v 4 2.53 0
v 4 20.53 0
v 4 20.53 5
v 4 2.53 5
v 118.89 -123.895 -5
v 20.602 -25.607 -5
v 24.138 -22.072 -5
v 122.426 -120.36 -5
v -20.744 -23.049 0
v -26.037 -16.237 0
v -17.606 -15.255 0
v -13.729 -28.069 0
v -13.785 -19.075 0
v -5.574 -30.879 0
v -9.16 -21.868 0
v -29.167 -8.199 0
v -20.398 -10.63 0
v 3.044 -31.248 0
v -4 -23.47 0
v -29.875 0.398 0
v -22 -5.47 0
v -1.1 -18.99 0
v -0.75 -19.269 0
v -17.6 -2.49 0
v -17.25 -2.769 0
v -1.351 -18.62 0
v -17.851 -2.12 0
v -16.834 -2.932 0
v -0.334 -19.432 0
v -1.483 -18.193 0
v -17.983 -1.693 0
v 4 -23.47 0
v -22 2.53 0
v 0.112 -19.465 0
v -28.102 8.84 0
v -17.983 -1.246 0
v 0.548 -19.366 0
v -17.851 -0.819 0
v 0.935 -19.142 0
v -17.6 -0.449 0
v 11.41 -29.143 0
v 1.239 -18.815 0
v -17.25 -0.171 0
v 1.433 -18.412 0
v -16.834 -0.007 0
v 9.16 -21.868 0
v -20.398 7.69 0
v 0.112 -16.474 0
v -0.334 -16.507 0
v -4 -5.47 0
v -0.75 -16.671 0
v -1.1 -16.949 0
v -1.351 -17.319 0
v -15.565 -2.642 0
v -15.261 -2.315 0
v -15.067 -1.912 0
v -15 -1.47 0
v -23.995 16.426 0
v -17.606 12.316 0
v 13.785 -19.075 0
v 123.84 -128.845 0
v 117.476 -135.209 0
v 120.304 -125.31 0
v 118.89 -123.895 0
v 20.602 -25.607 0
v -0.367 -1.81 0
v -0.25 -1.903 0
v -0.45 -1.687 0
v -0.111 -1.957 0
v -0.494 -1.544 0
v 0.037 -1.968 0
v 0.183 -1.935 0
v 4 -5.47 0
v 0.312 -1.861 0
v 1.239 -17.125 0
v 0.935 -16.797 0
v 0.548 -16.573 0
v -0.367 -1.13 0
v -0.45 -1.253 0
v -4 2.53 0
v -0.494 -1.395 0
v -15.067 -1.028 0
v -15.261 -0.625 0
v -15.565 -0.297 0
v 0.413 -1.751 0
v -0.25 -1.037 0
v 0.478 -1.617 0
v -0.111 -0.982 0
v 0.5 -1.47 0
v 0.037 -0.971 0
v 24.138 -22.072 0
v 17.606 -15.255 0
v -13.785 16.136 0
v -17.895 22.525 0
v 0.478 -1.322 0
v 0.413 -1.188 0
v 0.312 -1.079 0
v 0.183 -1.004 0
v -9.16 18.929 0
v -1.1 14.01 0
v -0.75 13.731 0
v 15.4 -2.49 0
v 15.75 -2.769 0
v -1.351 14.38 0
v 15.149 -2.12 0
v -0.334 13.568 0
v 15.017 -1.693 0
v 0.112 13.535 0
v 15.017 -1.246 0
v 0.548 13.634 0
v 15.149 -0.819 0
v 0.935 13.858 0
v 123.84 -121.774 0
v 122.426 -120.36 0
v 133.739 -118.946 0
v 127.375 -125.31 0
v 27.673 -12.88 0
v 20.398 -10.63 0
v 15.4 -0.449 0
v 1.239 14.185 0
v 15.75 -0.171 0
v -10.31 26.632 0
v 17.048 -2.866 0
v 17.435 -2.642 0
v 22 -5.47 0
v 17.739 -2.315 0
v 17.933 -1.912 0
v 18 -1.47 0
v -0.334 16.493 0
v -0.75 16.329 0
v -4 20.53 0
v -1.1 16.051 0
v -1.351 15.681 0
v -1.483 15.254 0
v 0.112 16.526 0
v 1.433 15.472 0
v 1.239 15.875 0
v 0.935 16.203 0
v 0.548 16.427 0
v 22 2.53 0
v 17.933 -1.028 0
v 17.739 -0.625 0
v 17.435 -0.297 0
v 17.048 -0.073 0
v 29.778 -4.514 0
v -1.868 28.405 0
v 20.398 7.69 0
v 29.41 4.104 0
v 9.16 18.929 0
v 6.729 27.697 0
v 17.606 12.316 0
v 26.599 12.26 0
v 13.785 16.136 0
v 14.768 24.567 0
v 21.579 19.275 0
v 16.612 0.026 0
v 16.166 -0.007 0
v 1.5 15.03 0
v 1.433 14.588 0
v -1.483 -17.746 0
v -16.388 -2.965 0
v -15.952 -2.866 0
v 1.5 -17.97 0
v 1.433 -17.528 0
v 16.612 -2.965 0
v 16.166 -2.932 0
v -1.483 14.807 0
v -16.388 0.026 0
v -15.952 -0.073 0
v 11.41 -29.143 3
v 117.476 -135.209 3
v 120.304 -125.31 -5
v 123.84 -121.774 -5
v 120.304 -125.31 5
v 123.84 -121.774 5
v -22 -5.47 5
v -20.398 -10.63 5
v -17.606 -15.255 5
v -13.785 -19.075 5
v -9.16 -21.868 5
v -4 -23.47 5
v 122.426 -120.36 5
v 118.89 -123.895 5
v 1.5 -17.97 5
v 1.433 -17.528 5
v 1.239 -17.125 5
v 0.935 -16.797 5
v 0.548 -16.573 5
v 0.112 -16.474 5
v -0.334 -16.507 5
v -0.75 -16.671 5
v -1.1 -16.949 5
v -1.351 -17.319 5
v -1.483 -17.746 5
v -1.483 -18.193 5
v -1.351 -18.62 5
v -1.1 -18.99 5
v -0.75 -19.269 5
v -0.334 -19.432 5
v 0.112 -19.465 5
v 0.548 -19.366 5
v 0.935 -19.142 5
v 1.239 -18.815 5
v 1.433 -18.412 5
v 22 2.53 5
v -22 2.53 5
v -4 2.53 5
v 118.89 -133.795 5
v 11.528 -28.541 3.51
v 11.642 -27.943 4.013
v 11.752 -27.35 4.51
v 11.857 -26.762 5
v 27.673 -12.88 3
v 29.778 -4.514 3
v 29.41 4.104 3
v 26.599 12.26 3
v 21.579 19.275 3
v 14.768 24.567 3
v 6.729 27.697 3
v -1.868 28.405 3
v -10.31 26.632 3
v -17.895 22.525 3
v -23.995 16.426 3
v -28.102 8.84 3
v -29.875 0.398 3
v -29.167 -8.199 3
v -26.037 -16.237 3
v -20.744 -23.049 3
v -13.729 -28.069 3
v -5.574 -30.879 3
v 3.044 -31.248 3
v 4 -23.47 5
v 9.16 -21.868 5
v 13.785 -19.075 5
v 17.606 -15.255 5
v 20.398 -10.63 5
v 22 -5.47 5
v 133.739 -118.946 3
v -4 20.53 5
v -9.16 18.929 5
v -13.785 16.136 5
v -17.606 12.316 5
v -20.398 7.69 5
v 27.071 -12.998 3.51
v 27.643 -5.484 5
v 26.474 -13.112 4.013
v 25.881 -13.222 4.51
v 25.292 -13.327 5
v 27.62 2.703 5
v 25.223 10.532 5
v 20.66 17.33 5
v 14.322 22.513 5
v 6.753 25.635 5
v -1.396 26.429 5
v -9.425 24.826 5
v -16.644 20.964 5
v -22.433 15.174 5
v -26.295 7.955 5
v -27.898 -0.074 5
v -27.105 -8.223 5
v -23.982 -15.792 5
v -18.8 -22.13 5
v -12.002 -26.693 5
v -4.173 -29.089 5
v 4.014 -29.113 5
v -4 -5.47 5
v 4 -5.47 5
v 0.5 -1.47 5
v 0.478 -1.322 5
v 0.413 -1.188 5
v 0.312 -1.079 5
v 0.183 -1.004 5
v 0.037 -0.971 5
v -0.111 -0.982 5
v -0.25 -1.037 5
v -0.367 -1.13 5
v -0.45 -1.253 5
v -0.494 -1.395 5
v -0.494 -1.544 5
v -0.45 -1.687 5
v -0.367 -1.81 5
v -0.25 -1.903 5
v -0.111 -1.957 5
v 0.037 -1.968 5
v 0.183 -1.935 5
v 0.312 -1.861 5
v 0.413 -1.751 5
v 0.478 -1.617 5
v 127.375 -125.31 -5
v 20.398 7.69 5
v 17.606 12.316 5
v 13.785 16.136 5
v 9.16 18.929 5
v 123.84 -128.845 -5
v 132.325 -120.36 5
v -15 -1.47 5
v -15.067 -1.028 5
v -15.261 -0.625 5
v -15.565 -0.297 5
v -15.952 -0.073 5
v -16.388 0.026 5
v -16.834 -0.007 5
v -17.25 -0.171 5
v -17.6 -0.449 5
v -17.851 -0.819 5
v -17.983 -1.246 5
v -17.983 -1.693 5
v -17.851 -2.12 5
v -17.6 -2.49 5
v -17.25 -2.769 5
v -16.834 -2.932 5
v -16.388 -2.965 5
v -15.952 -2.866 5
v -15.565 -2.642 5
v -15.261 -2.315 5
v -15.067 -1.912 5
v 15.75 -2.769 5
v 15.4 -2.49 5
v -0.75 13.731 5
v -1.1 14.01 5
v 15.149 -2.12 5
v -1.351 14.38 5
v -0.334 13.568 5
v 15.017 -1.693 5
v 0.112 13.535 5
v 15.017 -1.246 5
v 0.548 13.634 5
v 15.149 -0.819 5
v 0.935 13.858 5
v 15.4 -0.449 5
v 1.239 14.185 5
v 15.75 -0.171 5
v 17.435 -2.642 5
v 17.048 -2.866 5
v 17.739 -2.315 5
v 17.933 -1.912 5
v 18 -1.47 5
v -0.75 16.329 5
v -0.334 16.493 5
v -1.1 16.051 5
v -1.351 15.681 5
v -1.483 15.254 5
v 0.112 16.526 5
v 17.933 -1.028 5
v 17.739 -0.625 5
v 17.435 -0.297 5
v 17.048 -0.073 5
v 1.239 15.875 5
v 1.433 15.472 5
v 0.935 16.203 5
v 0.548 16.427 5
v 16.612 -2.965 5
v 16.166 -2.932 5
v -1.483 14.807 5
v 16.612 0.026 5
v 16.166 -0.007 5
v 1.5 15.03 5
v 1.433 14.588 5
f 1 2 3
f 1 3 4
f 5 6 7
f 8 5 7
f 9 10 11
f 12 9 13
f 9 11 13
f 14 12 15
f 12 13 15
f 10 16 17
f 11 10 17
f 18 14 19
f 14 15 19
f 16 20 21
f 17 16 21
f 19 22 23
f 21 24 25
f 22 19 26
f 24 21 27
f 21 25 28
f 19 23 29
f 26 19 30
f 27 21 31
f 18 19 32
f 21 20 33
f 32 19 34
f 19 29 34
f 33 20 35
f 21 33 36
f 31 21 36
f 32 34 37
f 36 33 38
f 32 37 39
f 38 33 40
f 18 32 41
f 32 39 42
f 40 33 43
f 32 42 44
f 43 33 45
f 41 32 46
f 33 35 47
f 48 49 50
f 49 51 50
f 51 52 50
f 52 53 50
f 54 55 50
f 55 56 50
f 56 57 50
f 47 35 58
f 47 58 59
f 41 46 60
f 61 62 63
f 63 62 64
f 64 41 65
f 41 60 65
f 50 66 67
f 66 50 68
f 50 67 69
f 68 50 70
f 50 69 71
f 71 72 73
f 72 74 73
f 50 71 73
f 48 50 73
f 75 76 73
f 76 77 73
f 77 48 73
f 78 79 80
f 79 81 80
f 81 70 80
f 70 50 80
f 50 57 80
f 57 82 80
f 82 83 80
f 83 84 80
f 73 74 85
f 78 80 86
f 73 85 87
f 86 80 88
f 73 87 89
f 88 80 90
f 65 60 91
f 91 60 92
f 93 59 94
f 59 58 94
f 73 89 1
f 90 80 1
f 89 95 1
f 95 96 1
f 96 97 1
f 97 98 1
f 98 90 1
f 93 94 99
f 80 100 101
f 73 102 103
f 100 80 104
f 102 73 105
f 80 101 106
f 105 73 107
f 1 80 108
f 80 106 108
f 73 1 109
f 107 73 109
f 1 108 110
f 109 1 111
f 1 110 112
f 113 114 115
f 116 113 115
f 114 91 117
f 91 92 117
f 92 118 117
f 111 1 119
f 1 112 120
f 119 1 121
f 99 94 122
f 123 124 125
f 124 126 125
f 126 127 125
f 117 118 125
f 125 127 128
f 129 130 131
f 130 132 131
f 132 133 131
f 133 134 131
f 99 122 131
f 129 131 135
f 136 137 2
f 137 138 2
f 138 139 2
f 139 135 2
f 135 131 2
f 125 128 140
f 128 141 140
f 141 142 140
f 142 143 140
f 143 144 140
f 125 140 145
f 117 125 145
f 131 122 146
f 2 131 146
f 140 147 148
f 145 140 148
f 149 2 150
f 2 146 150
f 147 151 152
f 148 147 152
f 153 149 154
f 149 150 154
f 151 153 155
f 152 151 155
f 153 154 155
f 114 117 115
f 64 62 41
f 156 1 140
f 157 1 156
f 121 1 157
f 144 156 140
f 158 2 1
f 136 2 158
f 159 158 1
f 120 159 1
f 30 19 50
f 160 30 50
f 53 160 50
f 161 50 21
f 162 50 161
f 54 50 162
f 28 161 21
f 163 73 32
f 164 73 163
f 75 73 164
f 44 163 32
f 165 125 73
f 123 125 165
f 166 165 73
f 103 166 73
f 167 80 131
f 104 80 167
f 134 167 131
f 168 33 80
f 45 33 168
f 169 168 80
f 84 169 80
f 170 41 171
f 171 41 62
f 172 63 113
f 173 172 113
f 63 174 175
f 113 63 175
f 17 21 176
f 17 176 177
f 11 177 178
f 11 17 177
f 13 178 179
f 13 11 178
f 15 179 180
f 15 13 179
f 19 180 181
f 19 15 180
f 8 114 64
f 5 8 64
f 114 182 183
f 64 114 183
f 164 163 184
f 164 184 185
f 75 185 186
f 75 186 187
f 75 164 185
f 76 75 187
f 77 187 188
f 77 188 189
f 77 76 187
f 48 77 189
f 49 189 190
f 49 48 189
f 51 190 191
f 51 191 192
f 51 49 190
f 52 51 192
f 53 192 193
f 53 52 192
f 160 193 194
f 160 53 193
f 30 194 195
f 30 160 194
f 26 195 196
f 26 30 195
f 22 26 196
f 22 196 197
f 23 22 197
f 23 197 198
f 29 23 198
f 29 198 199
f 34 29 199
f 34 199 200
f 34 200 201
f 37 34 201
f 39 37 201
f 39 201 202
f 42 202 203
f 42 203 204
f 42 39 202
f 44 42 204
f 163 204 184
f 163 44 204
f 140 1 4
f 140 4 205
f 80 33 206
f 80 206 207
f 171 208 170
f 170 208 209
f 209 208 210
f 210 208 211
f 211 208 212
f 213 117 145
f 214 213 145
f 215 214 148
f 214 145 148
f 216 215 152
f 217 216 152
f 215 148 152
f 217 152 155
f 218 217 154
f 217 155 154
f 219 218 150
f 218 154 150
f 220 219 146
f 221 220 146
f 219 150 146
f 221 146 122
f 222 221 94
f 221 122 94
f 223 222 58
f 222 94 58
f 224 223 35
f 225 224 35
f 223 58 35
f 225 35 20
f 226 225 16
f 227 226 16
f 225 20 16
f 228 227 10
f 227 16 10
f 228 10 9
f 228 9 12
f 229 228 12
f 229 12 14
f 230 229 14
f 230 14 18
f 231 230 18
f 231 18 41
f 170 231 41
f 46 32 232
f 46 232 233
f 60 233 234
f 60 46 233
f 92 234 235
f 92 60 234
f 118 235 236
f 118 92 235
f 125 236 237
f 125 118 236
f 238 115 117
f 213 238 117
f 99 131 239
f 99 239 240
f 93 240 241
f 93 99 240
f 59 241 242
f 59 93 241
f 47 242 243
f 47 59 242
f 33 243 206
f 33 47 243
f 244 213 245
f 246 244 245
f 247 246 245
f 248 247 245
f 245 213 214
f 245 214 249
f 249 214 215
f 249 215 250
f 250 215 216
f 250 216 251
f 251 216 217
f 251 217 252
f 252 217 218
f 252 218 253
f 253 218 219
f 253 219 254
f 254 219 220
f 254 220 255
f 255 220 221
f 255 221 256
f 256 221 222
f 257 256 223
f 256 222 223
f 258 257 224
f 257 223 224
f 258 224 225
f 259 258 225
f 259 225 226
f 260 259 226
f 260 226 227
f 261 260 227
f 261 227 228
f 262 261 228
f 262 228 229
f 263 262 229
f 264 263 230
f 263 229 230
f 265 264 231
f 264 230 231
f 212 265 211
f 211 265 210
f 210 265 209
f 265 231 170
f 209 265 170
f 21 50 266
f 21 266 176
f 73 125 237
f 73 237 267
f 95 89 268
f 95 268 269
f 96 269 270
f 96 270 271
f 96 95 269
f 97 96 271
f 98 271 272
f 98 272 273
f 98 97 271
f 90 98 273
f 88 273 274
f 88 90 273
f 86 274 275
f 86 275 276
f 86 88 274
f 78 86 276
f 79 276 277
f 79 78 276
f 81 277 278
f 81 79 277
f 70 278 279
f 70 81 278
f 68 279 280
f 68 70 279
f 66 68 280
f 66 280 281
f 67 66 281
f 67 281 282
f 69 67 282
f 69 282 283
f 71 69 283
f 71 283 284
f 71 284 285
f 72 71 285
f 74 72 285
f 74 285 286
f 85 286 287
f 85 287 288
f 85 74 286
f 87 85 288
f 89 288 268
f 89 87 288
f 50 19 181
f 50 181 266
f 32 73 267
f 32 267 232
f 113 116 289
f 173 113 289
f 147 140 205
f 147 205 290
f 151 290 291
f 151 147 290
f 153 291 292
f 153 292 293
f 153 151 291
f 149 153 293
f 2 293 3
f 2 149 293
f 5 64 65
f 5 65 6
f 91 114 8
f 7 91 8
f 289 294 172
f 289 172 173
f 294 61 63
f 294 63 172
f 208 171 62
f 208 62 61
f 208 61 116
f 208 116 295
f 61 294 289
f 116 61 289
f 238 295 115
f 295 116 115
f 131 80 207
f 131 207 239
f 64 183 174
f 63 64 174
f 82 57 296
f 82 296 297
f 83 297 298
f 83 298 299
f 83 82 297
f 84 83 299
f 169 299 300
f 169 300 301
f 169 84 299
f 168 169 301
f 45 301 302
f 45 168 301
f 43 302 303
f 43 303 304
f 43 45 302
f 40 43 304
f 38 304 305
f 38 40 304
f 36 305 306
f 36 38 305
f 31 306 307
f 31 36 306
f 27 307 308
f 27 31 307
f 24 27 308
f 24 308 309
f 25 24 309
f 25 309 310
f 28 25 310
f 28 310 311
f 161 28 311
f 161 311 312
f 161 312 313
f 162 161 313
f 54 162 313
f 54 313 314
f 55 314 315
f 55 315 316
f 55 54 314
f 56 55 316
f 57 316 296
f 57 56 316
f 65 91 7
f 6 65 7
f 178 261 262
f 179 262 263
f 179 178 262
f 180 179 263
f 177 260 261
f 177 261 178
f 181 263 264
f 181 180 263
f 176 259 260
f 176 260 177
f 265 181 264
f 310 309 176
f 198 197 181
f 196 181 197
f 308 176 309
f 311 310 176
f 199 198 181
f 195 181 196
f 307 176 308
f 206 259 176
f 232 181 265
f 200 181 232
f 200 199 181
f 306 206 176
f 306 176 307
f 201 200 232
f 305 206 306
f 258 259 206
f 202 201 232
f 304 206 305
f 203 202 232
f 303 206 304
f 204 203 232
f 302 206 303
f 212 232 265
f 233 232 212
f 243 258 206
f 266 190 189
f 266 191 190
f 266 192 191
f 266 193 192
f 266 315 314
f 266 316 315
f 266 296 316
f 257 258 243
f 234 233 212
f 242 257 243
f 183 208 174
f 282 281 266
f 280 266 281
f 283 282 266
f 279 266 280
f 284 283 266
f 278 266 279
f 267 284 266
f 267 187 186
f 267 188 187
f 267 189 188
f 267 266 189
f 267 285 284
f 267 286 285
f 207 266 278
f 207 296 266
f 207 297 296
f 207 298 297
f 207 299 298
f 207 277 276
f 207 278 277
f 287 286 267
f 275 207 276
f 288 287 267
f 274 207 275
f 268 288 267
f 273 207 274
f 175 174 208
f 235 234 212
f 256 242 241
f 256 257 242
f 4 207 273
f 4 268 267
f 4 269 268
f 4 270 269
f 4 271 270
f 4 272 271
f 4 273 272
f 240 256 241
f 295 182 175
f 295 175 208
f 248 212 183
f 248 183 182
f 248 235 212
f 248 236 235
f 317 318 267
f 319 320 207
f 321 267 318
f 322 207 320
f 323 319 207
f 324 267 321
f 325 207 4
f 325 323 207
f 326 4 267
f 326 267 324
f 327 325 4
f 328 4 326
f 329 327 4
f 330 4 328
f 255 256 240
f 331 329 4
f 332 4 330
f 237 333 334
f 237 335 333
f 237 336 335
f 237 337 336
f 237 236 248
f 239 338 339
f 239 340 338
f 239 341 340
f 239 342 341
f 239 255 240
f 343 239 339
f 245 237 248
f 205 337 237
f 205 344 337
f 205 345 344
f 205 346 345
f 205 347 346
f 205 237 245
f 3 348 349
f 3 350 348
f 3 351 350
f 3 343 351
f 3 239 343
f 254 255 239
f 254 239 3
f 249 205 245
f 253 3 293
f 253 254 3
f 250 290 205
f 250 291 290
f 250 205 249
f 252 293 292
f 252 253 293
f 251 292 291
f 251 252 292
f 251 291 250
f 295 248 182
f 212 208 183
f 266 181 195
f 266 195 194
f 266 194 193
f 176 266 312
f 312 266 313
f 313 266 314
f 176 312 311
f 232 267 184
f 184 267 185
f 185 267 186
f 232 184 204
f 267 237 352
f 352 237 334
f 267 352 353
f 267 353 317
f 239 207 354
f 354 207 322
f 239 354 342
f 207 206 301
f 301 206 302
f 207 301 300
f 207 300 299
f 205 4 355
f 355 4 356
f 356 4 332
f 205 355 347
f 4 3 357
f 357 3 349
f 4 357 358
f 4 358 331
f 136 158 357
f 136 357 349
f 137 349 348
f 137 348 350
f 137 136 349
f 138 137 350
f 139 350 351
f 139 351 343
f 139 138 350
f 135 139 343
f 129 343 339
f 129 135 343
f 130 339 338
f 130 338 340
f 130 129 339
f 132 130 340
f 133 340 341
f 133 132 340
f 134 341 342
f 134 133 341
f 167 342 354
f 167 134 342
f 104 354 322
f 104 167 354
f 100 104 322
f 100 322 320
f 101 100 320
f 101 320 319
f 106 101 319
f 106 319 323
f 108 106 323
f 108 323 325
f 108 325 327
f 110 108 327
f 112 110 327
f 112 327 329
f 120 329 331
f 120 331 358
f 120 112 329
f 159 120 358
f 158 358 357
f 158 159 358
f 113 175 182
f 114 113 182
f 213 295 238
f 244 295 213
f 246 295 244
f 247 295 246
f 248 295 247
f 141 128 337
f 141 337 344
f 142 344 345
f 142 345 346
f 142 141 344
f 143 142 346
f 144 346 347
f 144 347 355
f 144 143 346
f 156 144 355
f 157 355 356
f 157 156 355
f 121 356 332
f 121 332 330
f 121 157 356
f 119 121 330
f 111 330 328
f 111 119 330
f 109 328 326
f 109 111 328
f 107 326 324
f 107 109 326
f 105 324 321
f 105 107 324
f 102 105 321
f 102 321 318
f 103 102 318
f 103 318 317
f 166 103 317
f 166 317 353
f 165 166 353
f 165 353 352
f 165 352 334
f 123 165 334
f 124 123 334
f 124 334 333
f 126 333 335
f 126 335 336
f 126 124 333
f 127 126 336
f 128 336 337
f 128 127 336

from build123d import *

# Parameters (mm, degrees)
BOSS_EXTRU_1_DEPTH      = 5
ESQUISSE3_R             = 1.5
ESQUISSE3_R_2           = 0.5
ENL_V_MAT_EXTRU_1_DEPTH = 5
ESQUISSE7_W             = 5
ESQUISSE7_H             = 23
ESQUISSE7_H_2           = 5
BOSS_EXTRU_2_DEPTH      = 146
CHANFREIN1_SIZE         = 2
ENL_V_MAT_EXTRU_2_DEPTH = 146


with BuildPart() as part:
    # Esquisse6 → Boss.-Extru.1 (new body)
    with BuildSketch(Plane.XY):
        with BuildLine():
            Line((11.409894089, -29.143009992), (117.475911267, -135.20902717))
            Line((117.475911267, -135.20902717), (133.739367234, -118.945571203))
            Line((133.739367234, -118.945571203), (27.673350056, -12.879554025))
            ThreePointArc((27.673350056, -12.879554025), (-21.166010329, 19.696350392), (11.409894089, -29.143009992))
        make_face()
        with BuildLine():
            Line((-4, -23.469659936), (-4, -5.469659936))
            Line((-4, -5.469659936), (-22, -5.469659936))
            ThreePointArc((-22, -5.469659936), (-15.811388301, -17.281048237), (-4, -23.469659936))
        make_face(mode=Mode.SUBTRACT)
        with BuildLine():
            Line((-4, 2.530340064), (-4, 20.530340064))
            ThreePointArc((-4, 20.530340064), (-15.811388301, 14.341728365), (-22, 2.530340064))
            Line((-22, 2.530340064), (-4, 2.530340064))
        make_face(mode=Mode.SUBTRACT)
        with BuildLine():
            Line((4, 2.530340064), (22, 2.530340064))
            ThreePointArc((22, 2.530340064), (15.811388301, 14.341728365), (4, 20.530340064))
            Line((4, 20.530340064), (4, 2.530340064))
        make_face(mode=Mode.SUBTRACT)
        with BuildLine():
            Line((4, -5.469659936), (4, -23.469659936))
            ThreePointArc((4, -23.469659936), (15.811388301, -17.281048237), (22, -5.469659936))
            Line((22, -5.469659936), (4, -5.469659936))
        make_face(mode=Mode.SUBTRACT)
    extrude(amount=BOSS_EXTRU_1_DEPTH)

    # Esquisse3 → Enlèv. mat.-Extru.1 (cut)
    with BuildSketch(Plane.XY):
        with Locations((0, 15.030340064)):
            Circle(ESQUISSE3_R)
        with Locations((16.5, -1.469659936)):
            Circle(ESQUISSE3_R)
        with Locations((0, -17.969659936)):
            Circle(ESQUISSE3_R)
        with Locations((-16.5, -1.469659936)):
            Circle(ESQUISSE3_R)
        with Locations((0, -1.469659936)):
            Circle(ESQUISSE3_R_2)
    extrude(amount=ENL_V_MAT_EXTRU_1_DEPTH, mode=Mode.SUBTRACT)

    # Esquisse7 → Boss.-Extru.2 (add)
    with BuildSketch(Plane(origin=(126.342469219, -126.342469219, 0), x_dir=(0, 0, -1), z_dir=(0.7071067811865442, -0.7071067811865508, 0))):
        with Locations((-2.5, -1.039206507)):
            Rectangle(ESQUISSE7_W, ESQUISSE7_H)
        with Locations((2.5, -1.039206507)):
            Rectangle(ESQUISSE7_W, ESQUISSE7_H_2)
    extrude(amount=-BOSS_EXTRU_2_DEPTH)

    # Chanfrein1
    chanfrein1_edges = [part.edges().sort_by_distance(p)[0] for p in [
        (80.706358645, -65.912562614, 5),
        (-21.166010329, 19.696350392, 5),
        (64.442902678, -82.176018581, 5),
    ]]
    chamfer(chanfrein1_edges, length=CHANFREIN1_SIZE)

    # Esquisse8 → Enlèv. mat.-Extru.2 (cut)
    with BuildSketch(Plane.XY.offset(5)):
        Polygon((120.304338392, -125.309532234), (123.839872298, -121.773998328), (122.425658735, -120.359784766), (118.890124829, -123.895318671), align=None)
    extrude(amount=-ENL_V_MAT_EXTRU_2_DEPTH, mode=Mode.SUBTRACT)


solid = part.part
